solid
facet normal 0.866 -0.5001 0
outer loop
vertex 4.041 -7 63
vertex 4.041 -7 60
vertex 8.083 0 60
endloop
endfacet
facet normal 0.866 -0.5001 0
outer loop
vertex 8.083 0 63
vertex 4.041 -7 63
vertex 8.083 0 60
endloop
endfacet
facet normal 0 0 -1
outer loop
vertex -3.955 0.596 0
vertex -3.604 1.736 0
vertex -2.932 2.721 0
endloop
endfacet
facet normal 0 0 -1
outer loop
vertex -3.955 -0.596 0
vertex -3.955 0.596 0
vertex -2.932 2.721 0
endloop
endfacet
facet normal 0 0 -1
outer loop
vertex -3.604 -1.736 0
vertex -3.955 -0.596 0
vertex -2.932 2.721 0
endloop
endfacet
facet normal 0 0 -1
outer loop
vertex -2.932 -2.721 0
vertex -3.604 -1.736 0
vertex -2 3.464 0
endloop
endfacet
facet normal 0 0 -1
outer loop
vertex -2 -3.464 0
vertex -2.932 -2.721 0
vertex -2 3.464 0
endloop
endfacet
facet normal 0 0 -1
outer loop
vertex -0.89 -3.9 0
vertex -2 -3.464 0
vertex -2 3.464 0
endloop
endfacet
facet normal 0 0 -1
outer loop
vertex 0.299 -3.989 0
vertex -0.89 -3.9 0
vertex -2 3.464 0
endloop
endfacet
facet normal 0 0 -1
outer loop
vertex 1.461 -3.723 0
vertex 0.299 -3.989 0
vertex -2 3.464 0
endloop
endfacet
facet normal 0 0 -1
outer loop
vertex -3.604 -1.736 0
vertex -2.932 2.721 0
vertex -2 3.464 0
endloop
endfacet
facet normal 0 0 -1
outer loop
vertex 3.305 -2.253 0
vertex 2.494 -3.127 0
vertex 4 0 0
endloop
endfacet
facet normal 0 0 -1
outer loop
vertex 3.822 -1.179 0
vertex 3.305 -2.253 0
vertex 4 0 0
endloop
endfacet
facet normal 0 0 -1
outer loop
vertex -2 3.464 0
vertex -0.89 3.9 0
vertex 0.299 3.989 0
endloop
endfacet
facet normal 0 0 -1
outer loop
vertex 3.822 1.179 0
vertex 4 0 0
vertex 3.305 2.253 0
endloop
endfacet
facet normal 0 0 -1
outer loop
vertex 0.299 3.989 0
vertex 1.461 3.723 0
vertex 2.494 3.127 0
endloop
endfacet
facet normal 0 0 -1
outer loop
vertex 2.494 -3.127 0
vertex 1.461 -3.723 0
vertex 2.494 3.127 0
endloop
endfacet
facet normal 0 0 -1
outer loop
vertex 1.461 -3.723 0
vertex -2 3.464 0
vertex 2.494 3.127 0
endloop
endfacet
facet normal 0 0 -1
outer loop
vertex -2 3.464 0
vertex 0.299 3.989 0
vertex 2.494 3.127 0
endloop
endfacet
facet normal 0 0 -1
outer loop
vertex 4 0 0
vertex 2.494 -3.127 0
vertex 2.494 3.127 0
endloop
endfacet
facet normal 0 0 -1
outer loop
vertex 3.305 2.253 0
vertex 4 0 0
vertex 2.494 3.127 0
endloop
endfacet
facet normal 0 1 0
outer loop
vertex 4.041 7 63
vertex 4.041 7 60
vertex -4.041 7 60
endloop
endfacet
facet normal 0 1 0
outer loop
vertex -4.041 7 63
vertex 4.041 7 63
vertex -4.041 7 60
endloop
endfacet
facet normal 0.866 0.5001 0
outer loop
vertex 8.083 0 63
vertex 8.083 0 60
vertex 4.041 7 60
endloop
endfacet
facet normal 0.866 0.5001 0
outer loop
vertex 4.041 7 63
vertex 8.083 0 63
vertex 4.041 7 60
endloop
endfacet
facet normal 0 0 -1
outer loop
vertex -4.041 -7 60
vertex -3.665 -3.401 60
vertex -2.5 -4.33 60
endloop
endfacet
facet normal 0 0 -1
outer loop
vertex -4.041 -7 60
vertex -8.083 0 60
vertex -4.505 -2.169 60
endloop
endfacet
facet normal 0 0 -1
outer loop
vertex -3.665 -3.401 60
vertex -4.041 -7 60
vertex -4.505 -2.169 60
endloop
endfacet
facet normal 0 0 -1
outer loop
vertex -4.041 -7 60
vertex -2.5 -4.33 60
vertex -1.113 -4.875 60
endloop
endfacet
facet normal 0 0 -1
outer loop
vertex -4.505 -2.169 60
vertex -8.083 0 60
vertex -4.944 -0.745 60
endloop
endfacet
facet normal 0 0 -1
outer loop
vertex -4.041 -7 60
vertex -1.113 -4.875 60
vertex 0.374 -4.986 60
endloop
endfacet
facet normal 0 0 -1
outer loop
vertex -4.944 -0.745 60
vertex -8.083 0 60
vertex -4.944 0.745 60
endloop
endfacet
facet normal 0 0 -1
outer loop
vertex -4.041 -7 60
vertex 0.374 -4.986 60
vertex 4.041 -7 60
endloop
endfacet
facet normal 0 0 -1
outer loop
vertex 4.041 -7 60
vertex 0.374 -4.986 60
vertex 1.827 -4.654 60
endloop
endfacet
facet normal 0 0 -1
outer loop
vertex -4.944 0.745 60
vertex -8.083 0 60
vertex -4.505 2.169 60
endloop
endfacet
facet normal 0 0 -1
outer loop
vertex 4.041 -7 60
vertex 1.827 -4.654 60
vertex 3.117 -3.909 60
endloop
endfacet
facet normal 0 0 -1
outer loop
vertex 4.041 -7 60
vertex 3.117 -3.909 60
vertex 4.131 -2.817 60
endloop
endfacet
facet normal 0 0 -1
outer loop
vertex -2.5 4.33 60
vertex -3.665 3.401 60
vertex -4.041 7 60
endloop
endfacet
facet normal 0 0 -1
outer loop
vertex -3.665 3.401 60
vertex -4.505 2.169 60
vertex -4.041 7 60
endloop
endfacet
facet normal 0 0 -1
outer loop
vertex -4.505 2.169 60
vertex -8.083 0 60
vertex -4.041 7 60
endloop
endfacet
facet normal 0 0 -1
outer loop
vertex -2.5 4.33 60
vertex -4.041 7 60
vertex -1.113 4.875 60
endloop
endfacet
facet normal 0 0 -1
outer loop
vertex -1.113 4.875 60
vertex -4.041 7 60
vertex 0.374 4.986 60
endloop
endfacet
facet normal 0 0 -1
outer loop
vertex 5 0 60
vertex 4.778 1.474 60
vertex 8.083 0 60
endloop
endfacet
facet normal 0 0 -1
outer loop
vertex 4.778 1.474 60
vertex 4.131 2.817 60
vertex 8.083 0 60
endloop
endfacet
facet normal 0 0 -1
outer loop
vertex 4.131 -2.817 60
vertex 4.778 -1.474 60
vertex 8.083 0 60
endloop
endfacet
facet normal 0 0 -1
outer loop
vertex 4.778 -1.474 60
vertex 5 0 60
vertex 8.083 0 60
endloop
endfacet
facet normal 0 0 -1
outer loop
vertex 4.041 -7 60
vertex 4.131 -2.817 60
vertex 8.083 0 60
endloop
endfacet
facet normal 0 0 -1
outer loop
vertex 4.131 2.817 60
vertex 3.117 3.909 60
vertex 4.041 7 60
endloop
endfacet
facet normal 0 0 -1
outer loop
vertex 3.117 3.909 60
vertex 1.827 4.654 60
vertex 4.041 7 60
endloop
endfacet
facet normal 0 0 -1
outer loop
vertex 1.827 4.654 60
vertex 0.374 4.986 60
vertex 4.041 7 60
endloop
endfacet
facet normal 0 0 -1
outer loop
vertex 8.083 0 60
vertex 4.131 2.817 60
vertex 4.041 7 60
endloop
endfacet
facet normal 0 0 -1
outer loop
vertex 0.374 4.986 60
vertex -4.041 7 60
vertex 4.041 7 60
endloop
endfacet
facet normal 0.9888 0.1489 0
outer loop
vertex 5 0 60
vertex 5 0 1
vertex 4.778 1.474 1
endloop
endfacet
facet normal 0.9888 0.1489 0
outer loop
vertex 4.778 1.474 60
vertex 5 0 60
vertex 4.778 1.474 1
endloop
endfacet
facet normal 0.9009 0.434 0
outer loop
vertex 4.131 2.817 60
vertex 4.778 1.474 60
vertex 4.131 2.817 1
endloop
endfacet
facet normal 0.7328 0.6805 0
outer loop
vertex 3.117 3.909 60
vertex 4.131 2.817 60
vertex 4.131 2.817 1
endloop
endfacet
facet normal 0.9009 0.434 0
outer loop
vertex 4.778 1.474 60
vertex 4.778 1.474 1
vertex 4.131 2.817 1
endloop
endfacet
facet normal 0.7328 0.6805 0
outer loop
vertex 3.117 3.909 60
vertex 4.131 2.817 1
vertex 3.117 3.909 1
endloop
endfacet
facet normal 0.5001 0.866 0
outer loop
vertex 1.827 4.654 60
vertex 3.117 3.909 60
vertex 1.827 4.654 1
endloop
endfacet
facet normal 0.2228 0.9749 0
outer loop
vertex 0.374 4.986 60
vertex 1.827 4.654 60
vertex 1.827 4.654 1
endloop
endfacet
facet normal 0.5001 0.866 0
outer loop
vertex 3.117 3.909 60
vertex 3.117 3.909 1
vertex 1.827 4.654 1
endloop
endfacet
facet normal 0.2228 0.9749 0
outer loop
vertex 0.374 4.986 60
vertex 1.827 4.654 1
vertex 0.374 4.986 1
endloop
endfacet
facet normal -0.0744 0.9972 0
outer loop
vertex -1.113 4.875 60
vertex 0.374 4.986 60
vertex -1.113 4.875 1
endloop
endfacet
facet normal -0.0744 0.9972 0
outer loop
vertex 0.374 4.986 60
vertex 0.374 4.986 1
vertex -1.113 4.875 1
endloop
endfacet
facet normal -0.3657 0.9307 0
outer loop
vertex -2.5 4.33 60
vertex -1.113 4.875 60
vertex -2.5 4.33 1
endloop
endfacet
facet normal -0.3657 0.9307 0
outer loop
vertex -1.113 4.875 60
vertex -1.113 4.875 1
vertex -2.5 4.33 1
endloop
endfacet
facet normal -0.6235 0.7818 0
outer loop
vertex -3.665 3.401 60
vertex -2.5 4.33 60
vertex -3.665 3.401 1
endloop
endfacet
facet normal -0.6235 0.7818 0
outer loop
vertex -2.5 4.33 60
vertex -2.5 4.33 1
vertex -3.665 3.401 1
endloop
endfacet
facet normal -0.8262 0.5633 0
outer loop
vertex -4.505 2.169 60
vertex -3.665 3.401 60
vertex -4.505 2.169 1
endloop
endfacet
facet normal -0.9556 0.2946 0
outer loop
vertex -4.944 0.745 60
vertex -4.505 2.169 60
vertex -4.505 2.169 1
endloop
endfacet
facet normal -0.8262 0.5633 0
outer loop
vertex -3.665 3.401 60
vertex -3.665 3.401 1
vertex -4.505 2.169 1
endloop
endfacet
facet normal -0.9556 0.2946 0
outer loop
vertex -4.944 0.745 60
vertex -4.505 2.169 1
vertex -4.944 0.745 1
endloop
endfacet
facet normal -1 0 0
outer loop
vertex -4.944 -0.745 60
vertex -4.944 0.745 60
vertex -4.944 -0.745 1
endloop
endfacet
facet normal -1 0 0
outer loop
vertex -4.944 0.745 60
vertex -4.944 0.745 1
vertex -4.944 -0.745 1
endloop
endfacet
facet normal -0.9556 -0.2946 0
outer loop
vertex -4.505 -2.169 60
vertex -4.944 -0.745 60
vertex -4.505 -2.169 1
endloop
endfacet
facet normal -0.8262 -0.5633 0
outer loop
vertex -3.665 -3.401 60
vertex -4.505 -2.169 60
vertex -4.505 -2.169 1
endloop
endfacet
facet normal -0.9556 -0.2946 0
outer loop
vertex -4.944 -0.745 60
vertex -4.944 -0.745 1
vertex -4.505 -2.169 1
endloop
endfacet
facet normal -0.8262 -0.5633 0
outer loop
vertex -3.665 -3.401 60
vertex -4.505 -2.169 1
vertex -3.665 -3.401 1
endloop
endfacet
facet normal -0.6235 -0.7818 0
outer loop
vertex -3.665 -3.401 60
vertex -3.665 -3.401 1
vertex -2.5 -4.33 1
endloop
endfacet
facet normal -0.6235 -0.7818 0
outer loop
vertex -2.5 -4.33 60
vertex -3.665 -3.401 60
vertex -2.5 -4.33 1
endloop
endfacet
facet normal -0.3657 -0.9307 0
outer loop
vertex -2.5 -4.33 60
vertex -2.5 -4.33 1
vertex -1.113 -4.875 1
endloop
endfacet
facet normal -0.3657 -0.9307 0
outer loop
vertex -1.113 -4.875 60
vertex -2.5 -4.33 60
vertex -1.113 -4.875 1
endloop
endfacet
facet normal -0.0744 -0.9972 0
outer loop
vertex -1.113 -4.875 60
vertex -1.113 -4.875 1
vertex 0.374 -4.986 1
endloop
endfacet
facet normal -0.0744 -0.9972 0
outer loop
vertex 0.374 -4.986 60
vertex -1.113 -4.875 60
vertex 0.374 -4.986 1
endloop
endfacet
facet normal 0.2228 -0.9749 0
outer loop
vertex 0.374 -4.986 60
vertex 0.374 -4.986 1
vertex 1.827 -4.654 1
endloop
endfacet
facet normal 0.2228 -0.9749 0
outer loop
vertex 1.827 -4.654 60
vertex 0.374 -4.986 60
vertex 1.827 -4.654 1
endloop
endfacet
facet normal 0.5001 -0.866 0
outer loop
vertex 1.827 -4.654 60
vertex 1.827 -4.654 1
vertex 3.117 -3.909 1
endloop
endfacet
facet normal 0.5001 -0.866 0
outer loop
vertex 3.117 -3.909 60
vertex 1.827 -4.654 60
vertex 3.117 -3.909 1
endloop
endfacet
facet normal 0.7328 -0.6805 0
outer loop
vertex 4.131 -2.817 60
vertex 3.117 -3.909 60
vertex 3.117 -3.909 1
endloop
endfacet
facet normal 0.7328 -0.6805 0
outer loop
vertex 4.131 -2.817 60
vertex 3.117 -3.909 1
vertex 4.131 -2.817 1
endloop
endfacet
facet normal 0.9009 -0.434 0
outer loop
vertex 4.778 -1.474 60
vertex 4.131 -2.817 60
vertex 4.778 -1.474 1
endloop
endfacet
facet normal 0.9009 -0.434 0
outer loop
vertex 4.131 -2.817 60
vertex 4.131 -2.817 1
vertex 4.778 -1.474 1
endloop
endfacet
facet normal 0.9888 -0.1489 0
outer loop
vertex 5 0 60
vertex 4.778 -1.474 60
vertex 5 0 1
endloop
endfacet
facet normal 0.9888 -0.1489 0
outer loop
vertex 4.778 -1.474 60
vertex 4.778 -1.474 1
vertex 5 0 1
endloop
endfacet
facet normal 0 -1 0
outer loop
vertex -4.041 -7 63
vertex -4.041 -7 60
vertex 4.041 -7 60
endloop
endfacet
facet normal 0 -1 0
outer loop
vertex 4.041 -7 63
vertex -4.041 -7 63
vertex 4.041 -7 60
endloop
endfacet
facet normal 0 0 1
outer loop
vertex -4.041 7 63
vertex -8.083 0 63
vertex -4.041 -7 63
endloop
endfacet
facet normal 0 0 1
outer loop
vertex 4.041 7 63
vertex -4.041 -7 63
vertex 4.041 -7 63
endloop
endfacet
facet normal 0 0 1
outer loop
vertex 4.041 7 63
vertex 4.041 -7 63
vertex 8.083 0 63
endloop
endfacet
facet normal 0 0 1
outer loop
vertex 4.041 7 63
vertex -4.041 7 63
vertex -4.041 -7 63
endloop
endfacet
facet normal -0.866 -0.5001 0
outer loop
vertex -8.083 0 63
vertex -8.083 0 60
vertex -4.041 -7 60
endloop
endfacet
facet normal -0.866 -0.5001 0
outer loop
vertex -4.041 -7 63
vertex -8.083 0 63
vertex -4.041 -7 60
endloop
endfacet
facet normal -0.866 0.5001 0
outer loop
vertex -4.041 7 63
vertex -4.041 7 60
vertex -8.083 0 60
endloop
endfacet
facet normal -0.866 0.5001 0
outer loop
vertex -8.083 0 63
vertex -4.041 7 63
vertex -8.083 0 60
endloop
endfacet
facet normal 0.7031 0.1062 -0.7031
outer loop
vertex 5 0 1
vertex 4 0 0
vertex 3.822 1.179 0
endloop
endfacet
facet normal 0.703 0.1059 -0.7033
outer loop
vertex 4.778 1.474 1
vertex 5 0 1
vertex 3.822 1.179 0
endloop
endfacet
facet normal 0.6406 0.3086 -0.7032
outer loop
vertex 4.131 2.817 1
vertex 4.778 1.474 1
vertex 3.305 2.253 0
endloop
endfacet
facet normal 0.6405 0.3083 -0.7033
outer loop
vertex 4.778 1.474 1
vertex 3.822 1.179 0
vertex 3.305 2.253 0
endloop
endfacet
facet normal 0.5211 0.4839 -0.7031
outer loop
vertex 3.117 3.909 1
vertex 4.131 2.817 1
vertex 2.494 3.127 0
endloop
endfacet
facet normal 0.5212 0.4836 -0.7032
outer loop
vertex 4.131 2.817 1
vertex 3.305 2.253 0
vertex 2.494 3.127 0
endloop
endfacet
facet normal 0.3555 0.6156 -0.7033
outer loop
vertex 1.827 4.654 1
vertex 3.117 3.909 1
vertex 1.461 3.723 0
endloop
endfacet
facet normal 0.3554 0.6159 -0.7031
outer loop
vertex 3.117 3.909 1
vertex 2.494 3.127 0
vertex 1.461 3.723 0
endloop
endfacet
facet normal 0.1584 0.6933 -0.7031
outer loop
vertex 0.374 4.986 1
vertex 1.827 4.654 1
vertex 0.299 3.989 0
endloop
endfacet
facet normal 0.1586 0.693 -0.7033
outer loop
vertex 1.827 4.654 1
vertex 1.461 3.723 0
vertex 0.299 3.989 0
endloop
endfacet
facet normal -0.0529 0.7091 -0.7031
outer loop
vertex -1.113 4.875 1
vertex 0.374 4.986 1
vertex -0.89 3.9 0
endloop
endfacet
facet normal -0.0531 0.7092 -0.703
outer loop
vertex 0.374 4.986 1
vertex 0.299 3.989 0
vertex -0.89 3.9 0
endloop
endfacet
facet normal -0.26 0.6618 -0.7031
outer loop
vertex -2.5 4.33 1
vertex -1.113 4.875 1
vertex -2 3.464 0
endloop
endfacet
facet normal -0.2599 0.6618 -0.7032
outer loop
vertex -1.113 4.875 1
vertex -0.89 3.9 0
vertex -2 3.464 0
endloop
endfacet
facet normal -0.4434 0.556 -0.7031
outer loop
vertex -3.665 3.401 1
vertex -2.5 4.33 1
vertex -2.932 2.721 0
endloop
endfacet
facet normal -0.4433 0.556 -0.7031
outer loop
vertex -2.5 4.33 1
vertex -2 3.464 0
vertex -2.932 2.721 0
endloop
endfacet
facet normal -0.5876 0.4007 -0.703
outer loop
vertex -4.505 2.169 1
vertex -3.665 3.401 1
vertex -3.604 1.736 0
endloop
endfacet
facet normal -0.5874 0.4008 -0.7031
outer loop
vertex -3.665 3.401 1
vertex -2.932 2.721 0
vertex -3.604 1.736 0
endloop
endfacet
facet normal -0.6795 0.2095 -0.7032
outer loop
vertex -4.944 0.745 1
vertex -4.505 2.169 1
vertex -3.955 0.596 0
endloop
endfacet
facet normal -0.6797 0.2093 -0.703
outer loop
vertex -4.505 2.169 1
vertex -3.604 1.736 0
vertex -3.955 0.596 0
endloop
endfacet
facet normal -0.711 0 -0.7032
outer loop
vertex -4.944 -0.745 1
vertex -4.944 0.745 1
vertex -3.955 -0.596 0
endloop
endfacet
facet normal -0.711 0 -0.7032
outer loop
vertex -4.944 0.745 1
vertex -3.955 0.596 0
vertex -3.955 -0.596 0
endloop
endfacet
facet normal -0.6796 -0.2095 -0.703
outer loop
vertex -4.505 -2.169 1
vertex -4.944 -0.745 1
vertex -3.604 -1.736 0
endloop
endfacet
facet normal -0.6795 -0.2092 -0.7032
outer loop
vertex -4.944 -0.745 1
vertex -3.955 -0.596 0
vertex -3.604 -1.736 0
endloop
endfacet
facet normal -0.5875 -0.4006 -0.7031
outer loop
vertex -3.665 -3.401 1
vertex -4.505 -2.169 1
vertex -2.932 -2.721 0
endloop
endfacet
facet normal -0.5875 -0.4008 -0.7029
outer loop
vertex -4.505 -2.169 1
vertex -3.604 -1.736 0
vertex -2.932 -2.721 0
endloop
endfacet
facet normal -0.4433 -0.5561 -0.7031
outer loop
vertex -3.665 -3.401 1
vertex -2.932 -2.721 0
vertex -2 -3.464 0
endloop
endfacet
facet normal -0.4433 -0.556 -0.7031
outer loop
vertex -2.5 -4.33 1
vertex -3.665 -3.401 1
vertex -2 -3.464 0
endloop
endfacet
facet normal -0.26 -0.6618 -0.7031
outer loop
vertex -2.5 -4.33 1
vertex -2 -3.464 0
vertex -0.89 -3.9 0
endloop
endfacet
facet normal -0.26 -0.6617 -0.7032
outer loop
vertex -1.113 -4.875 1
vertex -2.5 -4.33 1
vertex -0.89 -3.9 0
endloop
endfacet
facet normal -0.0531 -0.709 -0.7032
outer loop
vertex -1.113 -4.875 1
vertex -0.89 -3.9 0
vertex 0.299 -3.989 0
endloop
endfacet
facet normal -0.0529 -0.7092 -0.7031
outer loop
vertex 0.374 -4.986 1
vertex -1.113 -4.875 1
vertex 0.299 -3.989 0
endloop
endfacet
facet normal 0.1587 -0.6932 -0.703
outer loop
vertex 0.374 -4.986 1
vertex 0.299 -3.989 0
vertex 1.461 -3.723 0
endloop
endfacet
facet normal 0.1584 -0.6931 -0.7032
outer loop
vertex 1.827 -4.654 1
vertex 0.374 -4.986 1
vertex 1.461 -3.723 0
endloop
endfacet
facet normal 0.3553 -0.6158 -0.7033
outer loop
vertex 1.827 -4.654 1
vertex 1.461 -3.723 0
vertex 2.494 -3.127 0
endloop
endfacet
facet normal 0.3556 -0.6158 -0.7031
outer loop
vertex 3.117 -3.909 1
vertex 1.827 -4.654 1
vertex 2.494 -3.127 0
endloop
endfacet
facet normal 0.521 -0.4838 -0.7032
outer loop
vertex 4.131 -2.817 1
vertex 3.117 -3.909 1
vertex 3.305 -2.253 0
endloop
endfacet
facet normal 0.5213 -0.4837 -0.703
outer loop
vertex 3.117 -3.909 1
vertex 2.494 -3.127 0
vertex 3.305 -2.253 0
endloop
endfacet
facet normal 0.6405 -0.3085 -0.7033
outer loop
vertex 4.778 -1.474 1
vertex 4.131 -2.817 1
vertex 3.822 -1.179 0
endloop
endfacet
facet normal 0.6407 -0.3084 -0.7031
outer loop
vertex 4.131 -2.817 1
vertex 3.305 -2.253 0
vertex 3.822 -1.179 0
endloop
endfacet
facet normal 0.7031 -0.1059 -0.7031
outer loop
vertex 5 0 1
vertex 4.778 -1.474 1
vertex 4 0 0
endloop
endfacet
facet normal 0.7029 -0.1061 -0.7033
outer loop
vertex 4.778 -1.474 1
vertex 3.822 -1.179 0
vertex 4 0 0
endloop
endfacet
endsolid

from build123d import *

# Parameters (mm, degrees)
F0_R     = 5
F1_DEPTH = 60
F2_SIZE2 = 1
F2_SIZE  = 1
F4_DEPTH = 3


with BuildPart() as f1:
    # F0 (on Top) → F1 (new body)
    with BuildSketch(Plane.XY):
        Circle(F0_R)
    extrude(amount=F1_DEPTH)

    # F2
    f2_edges = [f1.edges().sort_by_distance(p)[0] for p in [
        (-5, 0, 0),
    ]]
    chamfer(f2_edges, length=F2_SIZE, length2=F2_SIZE2)

    # F3 (on face) → F4 (join)
    with BuildSketch(Plane.XY.offset(60)):
        Polygon((8.082904, 0), (4.041452, 7), (-4.041452, 7), (-8.082904, 0), (-4.041452, -7), (4.041452, -7), align=None)
    extrude(amount=F4_DEPTH)


solid = f1.part
